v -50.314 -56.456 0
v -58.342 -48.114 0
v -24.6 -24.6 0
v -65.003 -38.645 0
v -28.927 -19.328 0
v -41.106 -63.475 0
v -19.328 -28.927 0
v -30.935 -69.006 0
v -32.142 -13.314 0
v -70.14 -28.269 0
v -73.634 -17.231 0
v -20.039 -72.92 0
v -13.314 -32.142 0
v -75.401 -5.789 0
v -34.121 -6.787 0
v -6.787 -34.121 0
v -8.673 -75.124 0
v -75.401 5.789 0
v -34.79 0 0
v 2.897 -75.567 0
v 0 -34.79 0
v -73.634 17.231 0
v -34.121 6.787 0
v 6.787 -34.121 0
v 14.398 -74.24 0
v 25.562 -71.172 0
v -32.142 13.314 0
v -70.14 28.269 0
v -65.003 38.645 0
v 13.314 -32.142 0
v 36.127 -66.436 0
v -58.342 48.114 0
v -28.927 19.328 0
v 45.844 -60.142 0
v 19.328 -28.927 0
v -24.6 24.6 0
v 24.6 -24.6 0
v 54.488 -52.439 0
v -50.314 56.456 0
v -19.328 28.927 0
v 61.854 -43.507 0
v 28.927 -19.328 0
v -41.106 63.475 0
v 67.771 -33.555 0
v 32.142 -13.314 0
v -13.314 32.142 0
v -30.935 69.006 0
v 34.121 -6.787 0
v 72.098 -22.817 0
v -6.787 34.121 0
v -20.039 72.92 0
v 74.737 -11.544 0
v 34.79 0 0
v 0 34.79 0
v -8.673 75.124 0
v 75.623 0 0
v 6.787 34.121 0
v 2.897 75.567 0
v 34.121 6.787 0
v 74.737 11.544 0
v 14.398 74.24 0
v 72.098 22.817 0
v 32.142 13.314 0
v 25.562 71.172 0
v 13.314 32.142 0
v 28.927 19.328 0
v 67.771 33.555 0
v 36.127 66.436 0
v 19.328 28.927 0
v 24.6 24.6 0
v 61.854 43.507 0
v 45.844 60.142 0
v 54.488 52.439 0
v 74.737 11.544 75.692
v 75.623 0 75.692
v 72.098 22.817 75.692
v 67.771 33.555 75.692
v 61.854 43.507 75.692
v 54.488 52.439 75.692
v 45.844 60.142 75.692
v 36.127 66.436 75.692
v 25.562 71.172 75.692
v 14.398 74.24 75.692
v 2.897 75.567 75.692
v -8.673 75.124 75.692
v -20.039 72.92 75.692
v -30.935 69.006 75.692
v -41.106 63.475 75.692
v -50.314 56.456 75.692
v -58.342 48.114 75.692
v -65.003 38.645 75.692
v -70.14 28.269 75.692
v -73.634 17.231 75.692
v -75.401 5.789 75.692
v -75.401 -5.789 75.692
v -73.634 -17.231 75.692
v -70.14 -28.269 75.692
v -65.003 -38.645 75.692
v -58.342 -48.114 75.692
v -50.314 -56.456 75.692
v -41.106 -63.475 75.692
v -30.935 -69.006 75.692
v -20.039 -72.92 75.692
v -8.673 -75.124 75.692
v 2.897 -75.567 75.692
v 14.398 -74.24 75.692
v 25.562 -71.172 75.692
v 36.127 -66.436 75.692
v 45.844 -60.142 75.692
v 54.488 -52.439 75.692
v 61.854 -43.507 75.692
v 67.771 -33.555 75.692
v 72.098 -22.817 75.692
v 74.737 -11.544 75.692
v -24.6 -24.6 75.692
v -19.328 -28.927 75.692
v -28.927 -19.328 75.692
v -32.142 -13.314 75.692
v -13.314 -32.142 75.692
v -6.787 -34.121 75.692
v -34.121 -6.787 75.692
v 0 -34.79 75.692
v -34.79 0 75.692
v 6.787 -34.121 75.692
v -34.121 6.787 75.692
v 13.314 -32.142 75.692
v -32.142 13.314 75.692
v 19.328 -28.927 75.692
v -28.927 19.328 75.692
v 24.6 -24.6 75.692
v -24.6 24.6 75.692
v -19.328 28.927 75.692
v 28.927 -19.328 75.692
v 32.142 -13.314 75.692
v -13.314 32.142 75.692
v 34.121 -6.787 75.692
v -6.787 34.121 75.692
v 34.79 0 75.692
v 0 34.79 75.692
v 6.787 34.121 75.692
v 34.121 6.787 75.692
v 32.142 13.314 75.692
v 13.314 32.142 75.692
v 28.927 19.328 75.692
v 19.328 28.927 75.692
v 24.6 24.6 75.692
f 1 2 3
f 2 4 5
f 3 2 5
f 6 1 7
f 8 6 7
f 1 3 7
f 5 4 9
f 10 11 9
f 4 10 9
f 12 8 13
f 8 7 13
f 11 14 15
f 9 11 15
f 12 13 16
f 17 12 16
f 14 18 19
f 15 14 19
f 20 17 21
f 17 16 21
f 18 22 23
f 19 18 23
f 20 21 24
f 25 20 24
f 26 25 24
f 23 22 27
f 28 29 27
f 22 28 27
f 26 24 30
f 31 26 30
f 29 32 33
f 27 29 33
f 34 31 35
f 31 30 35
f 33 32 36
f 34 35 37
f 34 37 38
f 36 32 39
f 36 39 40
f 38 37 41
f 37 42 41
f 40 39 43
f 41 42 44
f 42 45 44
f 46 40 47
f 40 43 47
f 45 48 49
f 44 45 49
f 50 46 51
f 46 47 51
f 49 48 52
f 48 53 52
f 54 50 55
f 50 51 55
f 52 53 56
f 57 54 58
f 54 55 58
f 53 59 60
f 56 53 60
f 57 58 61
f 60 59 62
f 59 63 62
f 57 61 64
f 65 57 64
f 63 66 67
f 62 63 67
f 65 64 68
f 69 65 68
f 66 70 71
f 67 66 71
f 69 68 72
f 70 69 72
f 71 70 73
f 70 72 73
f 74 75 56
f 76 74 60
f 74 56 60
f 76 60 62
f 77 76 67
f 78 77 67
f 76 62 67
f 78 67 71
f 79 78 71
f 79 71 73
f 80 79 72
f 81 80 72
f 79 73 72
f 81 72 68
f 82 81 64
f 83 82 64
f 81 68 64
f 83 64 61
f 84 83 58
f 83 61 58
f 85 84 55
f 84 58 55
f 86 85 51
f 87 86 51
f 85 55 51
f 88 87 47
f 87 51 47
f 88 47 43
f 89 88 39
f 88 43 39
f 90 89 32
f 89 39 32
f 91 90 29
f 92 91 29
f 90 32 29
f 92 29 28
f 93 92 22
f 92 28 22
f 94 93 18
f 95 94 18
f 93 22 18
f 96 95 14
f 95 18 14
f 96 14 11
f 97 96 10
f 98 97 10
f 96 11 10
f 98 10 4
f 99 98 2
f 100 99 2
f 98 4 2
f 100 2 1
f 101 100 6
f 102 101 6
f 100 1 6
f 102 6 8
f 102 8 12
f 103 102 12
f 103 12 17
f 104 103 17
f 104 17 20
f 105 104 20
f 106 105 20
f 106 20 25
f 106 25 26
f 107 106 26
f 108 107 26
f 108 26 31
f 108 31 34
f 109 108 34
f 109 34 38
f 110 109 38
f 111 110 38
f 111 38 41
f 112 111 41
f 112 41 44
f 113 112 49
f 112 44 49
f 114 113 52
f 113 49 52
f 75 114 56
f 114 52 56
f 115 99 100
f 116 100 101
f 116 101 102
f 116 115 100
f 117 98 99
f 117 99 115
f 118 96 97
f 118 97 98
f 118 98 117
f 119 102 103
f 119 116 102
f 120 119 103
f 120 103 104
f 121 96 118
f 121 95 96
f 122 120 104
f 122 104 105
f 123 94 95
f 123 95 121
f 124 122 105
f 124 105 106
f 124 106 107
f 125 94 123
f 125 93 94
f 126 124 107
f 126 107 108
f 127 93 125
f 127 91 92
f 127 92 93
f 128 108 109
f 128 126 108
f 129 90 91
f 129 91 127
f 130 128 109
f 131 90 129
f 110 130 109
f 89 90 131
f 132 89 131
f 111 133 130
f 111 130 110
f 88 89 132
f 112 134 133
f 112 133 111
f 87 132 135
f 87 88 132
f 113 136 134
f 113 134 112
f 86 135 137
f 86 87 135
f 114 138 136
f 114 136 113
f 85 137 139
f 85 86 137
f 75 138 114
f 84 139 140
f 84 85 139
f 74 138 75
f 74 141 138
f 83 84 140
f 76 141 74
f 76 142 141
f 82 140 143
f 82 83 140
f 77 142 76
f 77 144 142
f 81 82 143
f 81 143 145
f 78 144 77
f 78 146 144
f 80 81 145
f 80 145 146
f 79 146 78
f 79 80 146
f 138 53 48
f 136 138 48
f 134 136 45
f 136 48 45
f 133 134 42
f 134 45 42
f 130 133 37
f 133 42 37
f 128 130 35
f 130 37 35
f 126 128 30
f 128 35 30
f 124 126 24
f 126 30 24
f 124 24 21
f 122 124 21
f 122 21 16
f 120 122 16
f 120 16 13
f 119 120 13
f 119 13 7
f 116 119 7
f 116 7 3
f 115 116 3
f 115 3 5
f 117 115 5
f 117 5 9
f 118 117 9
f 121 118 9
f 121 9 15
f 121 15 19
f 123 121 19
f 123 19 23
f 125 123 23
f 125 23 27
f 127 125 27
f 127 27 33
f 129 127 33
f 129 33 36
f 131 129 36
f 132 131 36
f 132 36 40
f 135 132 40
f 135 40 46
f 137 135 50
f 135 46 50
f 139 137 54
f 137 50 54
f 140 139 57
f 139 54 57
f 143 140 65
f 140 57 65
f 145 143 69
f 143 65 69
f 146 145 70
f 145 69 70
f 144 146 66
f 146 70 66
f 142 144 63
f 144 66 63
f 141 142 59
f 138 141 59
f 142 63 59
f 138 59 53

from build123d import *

# Parameters (mm, degrees)
F0_R      = 75.62278
F1_DEPTH  = 75.692
F2_R      = 34.789881
F3_DEPTH  = 148.844
F3_FACE_R = 34.789881
F4_DEPTH  = 287.274


with BuildPart() as f1:
    # F0 (on Top) → F1 (new body)
    with BuildSketch(Plane.XY):
        Circle(F0_R)
    extrude(amount=F1_DEPTH)

    # F2 (on face) → F3 (join)
    with BuildSketch(Plane.XY.offset(75.692)):
        Circle(F2_R)
    extrude(amount=-F3_DEPTH)

    # F3_face (on face) → F4 (cut)
    with BuildSketch(Plane(origin=(0, 0, -73.152), x_dir=(1, 0, 0), z_dir=(0, 0, -1))):
        Circle(F3_FACE_R)
    extrude(amount=-F4_DEPTH, mode=Mode.SUBTRACT)


solid = f1.part
